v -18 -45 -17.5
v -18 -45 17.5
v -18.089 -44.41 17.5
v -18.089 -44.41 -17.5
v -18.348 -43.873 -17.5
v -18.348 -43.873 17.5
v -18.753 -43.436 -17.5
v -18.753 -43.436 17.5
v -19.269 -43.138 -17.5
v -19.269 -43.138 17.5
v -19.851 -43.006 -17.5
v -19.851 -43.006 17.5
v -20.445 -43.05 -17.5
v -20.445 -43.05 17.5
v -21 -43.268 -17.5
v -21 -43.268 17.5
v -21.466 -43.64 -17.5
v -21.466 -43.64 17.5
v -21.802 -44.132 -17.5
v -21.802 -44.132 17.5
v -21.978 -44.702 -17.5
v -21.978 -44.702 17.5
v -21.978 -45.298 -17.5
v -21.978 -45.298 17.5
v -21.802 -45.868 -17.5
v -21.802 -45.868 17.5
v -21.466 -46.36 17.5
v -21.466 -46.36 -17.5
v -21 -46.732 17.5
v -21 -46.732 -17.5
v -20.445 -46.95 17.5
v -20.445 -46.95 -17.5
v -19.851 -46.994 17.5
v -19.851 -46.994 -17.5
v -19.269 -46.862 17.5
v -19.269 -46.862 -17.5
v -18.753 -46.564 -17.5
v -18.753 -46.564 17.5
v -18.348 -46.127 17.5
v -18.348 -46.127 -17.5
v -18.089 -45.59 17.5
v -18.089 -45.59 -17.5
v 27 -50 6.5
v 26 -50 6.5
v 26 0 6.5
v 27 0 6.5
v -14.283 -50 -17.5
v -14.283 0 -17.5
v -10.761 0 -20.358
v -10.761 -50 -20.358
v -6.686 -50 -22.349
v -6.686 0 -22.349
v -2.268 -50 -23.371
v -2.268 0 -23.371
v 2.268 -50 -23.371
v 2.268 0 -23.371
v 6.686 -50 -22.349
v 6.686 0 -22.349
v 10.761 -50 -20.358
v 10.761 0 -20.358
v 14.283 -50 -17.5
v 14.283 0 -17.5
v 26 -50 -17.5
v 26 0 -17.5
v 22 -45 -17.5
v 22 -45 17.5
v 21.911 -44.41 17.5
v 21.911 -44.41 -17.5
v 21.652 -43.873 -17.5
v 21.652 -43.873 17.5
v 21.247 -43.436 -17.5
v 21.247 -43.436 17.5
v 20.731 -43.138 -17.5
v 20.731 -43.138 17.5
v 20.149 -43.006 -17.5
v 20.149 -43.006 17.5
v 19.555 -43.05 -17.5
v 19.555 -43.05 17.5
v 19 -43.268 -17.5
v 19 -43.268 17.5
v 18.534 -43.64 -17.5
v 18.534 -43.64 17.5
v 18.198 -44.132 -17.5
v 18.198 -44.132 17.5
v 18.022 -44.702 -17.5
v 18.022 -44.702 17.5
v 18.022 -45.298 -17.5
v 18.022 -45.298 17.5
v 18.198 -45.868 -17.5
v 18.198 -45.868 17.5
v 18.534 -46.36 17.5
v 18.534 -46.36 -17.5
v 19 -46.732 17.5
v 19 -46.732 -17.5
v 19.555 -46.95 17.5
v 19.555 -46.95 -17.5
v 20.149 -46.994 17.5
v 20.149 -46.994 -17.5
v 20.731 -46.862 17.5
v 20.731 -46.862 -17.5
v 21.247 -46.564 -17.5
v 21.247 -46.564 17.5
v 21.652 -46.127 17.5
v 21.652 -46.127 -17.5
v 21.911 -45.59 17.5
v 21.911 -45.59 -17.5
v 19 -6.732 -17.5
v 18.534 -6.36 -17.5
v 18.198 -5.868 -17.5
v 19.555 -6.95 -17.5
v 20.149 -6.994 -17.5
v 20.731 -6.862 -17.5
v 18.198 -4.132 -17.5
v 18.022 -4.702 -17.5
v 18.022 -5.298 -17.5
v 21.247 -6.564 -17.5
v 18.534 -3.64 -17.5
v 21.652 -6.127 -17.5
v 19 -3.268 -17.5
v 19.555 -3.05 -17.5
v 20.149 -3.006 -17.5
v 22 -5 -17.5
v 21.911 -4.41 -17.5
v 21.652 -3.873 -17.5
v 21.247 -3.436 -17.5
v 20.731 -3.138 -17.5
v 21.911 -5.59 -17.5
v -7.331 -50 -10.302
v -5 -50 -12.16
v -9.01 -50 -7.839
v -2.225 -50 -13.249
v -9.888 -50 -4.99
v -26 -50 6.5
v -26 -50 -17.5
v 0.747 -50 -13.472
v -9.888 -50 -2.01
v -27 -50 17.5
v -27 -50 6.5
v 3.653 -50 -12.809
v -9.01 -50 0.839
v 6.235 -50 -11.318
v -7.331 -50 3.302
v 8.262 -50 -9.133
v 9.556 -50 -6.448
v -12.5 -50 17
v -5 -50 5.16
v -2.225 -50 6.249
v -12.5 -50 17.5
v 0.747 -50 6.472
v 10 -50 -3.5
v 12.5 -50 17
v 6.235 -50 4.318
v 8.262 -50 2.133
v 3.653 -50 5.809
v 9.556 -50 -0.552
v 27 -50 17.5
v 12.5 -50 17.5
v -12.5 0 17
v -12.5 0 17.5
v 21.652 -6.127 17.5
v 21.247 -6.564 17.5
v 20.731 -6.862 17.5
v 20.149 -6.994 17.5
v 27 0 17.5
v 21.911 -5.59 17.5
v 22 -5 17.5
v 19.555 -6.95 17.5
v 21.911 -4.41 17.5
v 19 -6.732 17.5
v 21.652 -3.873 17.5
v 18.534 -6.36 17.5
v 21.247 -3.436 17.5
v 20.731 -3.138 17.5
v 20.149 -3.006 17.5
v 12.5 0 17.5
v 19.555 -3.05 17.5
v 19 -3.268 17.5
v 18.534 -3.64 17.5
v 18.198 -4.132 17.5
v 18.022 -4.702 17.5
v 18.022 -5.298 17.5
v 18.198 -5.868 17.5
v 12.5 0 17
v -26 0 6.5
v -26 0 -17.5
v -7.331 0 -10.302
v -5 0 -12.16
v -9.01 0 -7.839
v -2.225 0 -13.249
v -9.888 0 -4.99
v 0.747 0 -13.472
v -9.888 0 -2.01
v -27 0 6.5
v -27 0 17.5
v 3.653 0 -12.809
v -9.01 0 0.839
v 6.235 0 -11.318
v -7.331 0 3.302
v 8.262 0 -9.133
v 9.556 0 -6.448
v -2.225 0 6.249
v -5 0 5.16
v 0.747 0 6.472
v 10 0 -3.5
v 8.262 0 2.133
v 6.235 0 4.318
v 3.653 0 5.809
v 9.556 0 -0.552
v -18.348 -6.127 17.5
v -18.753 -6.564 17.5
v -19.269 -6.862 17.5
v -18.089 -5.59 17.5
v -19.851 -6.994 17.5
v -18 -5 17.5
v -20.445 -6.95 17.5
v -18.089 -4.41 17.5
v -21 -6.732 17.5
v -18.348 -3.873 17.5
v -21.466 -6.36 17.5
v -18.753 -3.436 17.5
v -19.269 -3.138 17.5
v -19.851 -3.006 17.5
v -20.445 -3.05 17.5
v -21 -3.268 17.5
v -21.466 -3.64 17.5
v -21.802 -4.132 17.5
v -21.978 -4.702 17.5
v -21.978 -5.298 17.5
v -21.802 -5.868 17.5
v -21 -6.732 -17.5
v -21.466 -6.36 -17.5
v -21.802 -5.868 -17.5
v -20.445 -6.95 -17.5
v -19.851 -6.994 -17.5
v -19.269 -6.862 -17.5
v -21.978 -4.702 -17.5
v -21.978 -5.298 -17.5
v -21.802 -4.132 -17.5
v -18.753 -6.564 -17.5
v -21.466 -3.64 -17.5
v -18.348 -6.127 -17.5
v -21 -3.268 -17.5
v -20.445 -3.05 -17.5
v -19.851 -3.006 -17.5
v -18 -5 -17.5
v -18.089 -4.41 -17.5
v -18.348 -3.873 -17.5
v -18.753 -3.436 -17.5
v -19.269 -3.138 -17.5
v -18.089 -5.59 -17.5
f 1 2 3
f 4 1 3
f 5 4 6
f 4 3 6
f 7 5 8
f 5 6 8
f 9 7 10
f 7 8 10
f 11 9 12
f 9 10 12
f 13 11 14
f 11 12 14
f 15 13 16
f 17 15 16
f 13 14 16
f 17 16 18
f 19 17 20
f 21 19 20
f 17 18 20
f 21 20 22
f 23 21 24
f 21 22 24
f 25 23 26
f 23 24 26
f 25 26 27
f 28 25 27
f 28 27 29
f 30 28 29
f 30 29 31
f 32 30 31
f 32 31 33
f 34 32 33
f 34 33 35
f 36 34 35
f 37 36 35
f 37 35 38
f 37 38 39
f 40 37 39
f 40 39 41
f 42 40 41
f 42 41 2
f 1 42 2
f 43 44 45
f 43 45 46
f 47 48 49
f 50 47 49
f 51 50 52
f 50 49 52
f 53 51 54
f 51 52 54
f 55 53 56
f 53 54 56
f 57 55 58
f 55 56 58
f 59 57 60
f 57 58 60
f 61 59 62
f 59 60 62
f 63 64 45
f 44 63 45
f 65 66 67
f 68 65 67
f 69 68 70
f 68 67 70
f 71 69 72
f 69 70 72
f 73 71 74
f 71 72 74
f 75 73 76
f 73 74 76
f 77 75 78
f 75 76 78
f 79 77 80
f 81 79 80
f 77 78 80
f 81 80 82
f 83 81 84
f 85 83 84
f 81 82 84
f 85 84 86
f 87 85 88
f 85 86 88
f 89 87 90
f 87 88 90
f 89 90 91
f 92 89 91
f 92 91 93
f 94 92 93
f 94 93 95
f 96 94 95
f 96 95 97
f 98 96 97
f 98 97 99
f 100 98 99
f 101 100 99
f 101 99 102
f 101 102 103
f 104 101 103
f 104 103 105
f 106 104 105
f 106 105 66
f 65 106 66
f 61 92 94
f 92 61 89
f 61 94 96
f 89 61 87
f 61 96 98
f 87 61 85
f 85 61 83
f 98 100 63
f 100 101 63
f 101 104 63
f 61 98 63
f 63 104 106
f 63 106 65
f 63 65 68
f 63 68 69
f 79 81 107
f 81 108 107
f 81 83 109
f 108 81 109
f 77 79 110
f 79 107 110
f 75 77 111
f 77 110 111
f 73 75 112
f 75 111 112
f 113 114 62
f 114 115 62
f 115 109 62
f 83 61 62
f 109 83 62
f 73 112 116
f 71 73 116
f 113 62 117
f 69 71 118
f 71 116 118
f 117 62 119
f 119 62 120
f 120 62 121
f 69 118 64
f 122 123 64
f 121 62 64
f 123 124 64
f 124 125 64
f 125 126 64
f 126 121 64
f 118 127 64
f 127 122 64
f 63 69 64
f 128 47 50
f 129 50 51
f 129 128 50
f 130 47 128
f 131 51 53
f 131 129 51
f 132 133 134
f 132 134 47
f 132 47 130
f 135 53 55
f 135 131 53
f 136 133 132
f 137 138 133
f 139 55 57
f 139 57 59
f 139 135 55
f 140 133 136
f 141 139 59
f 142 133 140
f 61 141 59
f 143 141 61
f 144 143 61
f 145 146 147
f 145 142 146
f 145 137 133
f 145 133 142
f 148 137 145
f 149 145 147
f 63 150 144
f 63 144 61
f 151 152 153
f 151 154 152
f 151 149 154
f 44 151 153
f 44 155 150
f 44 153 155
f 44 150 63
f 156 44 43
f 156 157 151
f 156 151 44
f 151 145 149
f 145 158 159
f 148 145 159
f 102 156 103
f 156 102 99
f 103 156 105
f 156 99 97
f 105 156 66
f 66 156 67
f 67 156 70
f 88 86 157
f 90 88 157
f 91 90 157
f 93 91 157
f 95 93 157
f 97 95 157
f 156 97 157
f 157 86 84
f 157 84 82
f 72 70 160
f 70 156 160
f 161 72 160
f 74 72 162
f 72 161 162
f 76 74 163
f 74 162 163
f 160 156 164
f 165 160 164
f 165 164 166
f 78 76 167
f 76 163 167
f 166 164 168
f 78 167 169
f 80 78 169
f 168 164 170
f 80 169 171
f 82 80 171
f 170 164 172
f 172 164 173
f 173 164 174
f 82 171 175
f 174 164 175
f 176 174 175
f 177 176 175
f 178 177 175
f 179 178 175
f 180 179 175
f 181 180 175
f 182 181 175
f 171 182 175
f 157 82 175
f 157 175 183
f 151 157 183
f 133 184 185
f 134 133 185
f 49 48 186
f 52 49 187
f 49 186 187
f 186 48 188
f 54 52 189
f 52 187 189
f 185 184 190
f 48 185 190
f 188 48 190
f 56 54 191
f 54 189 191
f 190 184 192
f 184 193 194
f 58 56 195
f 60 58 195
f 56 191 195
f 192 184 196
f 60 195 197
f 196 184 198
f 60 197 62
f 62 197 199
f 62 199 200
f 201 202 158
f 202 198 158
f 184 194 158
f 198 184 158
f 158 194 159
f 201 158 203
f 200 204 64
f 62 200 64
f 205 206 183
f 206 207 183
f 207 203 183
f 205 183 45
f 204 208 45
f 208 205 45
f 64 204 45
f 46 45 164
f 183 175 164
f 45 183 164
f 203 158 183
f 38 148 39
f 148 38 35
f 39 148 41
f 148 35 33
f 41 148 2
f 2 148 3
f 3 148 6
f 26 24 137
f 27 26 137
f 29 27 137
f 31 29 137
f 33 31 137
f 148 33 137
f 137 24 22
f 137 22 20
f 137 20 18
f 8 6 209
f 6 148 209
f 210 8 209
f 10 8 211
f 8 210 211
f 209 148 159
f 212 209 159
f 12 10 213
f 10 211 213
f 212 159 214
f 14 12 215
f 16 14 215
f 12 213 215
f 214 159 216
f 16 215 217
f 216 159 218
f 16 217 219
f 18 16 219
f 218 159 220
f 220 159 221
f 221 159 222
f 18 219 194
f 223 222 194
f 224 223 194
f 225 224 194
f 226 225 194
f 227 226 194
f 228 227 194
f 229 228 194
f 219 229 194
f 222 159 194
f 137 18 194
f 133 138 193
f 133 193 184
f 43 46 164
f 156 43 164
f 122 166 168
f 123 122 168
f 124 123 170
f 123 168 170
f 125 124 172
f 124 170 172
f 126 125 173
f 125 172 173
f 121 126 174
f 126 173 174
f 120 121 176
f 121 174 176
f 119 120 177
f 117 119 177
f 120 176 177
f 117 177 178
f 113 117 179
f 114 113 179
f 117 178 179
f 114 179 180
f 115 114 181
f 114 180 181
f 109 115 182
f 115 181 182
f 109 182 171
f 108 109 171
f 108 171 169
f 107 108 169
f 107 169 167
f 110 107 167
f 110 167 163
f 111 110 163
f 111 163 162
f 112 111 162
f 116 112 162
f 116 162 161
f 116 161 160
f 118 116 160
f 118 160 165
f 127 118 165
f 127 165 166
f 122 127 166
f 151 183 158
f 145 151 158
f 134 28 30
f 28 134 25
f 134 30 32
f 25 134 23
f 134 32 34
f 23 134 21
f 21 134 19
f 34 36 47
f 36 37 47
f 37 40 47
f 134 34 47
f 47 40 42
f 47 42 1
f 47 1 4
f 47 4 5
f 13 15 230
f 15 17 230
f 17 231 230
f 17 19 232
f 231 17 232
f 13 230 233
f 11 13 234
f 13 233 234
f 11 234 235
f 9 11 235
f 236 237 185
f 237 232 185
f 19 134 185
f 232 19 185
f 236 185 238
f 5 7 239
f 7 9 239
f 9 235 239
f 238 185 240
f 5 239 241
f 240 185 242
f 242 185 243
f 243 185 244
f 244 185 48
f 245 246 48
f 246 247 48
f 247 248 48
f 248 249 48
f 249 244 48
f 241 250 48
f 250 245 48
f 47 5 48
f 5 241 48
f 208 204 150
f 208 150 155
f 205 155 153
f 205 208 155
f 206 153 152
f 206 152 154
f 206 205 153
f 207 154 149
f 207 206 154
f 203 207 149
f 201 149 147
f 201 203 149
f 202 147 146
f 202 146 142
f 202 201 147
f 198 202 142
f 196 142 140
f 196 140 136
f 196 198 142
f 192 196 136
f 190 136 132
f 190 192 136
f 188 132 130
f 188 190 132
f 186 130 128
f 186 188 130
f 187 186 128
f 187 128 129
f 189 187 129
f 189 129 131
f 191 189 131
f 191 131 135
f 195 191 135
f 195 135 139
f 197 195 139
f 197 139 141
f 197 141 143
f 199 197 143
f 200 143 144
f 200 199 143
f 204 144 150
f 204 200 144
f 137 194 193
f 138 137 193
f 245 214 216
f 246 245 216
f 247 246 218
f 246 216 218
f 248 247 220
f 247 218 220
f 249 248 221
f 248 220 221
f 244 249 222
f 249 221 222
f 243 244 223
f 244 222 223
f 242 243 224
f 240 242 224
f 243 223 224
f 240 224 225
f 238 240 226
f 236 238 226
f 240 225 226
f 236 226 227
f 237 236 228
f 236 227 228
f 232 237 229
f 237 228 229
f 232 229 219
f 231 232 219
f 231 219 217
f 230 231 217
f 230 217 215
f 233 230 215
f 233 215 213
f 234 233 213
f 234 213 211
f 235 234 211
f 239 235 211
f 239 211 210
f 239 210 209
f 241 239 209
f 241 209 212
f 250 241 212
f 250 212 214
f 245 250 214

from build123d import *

# Parameters (mm, degrees)
F0_R     = 10
F1_DEPTH = 50
F2_R     = 2
F3_DEPTH = 41.001


with BuildPart() as f1:
    # F0 (on Front) → F1 (new body)
    with BuildSketch(Plane.XZ):
        with BuildLine():
            Line((14.282857, -17.5), (26, -17.5))
            Line((26, -17.5), (26, 6.5))
            Line((26, 6.5), (27, 6.5))
            Line((27, 6.5), (27, 17.5))
            Line((27, 17.5), (12.5, 17.5))
            Line((12.5, 17.5), (12.5, 17))
            Line((12.5, 17), (-12.5, 17))
            Line((-12.5, 17), (-12.5, 17.5))
            Line((-12.5, 17.5), (-27, 17.5))
            Line((-27, 17.5), (-27, 6.5))
            Line((-27, 6.5), (-26, 6.5))
            Line((-26, 6.5), (-26, -17.5))
            Line((-26, -17.5), (-14.282857, -17.5))
            ThreePointArc((-14.282857, -17.5), (0, -23.5), (14.282857, -17.5))
        make_face()
        with Locations((0, -3.5)):
            Circle(F0_R, mode=Mode.SUBTRACT)
    extrude(amount=F1_DEPTH)

    # F2 (on face) → F3 (cut, through all)
    with BuildSketch(Plane.XY.offset(17.5)):
        with Locations((20, -45)):
            Circle(F2_R)
        with Locations((-20, -45)):
            Circle(F2_R)
        with Locations((-20, -5)):
            Circle(F2_R)
        with Locations((20, -5)):
            Circle(F2_R)
    extrude(amount=-F3_DEPTH, mode=Mode.SUBTRACT)


solid = f1.part
